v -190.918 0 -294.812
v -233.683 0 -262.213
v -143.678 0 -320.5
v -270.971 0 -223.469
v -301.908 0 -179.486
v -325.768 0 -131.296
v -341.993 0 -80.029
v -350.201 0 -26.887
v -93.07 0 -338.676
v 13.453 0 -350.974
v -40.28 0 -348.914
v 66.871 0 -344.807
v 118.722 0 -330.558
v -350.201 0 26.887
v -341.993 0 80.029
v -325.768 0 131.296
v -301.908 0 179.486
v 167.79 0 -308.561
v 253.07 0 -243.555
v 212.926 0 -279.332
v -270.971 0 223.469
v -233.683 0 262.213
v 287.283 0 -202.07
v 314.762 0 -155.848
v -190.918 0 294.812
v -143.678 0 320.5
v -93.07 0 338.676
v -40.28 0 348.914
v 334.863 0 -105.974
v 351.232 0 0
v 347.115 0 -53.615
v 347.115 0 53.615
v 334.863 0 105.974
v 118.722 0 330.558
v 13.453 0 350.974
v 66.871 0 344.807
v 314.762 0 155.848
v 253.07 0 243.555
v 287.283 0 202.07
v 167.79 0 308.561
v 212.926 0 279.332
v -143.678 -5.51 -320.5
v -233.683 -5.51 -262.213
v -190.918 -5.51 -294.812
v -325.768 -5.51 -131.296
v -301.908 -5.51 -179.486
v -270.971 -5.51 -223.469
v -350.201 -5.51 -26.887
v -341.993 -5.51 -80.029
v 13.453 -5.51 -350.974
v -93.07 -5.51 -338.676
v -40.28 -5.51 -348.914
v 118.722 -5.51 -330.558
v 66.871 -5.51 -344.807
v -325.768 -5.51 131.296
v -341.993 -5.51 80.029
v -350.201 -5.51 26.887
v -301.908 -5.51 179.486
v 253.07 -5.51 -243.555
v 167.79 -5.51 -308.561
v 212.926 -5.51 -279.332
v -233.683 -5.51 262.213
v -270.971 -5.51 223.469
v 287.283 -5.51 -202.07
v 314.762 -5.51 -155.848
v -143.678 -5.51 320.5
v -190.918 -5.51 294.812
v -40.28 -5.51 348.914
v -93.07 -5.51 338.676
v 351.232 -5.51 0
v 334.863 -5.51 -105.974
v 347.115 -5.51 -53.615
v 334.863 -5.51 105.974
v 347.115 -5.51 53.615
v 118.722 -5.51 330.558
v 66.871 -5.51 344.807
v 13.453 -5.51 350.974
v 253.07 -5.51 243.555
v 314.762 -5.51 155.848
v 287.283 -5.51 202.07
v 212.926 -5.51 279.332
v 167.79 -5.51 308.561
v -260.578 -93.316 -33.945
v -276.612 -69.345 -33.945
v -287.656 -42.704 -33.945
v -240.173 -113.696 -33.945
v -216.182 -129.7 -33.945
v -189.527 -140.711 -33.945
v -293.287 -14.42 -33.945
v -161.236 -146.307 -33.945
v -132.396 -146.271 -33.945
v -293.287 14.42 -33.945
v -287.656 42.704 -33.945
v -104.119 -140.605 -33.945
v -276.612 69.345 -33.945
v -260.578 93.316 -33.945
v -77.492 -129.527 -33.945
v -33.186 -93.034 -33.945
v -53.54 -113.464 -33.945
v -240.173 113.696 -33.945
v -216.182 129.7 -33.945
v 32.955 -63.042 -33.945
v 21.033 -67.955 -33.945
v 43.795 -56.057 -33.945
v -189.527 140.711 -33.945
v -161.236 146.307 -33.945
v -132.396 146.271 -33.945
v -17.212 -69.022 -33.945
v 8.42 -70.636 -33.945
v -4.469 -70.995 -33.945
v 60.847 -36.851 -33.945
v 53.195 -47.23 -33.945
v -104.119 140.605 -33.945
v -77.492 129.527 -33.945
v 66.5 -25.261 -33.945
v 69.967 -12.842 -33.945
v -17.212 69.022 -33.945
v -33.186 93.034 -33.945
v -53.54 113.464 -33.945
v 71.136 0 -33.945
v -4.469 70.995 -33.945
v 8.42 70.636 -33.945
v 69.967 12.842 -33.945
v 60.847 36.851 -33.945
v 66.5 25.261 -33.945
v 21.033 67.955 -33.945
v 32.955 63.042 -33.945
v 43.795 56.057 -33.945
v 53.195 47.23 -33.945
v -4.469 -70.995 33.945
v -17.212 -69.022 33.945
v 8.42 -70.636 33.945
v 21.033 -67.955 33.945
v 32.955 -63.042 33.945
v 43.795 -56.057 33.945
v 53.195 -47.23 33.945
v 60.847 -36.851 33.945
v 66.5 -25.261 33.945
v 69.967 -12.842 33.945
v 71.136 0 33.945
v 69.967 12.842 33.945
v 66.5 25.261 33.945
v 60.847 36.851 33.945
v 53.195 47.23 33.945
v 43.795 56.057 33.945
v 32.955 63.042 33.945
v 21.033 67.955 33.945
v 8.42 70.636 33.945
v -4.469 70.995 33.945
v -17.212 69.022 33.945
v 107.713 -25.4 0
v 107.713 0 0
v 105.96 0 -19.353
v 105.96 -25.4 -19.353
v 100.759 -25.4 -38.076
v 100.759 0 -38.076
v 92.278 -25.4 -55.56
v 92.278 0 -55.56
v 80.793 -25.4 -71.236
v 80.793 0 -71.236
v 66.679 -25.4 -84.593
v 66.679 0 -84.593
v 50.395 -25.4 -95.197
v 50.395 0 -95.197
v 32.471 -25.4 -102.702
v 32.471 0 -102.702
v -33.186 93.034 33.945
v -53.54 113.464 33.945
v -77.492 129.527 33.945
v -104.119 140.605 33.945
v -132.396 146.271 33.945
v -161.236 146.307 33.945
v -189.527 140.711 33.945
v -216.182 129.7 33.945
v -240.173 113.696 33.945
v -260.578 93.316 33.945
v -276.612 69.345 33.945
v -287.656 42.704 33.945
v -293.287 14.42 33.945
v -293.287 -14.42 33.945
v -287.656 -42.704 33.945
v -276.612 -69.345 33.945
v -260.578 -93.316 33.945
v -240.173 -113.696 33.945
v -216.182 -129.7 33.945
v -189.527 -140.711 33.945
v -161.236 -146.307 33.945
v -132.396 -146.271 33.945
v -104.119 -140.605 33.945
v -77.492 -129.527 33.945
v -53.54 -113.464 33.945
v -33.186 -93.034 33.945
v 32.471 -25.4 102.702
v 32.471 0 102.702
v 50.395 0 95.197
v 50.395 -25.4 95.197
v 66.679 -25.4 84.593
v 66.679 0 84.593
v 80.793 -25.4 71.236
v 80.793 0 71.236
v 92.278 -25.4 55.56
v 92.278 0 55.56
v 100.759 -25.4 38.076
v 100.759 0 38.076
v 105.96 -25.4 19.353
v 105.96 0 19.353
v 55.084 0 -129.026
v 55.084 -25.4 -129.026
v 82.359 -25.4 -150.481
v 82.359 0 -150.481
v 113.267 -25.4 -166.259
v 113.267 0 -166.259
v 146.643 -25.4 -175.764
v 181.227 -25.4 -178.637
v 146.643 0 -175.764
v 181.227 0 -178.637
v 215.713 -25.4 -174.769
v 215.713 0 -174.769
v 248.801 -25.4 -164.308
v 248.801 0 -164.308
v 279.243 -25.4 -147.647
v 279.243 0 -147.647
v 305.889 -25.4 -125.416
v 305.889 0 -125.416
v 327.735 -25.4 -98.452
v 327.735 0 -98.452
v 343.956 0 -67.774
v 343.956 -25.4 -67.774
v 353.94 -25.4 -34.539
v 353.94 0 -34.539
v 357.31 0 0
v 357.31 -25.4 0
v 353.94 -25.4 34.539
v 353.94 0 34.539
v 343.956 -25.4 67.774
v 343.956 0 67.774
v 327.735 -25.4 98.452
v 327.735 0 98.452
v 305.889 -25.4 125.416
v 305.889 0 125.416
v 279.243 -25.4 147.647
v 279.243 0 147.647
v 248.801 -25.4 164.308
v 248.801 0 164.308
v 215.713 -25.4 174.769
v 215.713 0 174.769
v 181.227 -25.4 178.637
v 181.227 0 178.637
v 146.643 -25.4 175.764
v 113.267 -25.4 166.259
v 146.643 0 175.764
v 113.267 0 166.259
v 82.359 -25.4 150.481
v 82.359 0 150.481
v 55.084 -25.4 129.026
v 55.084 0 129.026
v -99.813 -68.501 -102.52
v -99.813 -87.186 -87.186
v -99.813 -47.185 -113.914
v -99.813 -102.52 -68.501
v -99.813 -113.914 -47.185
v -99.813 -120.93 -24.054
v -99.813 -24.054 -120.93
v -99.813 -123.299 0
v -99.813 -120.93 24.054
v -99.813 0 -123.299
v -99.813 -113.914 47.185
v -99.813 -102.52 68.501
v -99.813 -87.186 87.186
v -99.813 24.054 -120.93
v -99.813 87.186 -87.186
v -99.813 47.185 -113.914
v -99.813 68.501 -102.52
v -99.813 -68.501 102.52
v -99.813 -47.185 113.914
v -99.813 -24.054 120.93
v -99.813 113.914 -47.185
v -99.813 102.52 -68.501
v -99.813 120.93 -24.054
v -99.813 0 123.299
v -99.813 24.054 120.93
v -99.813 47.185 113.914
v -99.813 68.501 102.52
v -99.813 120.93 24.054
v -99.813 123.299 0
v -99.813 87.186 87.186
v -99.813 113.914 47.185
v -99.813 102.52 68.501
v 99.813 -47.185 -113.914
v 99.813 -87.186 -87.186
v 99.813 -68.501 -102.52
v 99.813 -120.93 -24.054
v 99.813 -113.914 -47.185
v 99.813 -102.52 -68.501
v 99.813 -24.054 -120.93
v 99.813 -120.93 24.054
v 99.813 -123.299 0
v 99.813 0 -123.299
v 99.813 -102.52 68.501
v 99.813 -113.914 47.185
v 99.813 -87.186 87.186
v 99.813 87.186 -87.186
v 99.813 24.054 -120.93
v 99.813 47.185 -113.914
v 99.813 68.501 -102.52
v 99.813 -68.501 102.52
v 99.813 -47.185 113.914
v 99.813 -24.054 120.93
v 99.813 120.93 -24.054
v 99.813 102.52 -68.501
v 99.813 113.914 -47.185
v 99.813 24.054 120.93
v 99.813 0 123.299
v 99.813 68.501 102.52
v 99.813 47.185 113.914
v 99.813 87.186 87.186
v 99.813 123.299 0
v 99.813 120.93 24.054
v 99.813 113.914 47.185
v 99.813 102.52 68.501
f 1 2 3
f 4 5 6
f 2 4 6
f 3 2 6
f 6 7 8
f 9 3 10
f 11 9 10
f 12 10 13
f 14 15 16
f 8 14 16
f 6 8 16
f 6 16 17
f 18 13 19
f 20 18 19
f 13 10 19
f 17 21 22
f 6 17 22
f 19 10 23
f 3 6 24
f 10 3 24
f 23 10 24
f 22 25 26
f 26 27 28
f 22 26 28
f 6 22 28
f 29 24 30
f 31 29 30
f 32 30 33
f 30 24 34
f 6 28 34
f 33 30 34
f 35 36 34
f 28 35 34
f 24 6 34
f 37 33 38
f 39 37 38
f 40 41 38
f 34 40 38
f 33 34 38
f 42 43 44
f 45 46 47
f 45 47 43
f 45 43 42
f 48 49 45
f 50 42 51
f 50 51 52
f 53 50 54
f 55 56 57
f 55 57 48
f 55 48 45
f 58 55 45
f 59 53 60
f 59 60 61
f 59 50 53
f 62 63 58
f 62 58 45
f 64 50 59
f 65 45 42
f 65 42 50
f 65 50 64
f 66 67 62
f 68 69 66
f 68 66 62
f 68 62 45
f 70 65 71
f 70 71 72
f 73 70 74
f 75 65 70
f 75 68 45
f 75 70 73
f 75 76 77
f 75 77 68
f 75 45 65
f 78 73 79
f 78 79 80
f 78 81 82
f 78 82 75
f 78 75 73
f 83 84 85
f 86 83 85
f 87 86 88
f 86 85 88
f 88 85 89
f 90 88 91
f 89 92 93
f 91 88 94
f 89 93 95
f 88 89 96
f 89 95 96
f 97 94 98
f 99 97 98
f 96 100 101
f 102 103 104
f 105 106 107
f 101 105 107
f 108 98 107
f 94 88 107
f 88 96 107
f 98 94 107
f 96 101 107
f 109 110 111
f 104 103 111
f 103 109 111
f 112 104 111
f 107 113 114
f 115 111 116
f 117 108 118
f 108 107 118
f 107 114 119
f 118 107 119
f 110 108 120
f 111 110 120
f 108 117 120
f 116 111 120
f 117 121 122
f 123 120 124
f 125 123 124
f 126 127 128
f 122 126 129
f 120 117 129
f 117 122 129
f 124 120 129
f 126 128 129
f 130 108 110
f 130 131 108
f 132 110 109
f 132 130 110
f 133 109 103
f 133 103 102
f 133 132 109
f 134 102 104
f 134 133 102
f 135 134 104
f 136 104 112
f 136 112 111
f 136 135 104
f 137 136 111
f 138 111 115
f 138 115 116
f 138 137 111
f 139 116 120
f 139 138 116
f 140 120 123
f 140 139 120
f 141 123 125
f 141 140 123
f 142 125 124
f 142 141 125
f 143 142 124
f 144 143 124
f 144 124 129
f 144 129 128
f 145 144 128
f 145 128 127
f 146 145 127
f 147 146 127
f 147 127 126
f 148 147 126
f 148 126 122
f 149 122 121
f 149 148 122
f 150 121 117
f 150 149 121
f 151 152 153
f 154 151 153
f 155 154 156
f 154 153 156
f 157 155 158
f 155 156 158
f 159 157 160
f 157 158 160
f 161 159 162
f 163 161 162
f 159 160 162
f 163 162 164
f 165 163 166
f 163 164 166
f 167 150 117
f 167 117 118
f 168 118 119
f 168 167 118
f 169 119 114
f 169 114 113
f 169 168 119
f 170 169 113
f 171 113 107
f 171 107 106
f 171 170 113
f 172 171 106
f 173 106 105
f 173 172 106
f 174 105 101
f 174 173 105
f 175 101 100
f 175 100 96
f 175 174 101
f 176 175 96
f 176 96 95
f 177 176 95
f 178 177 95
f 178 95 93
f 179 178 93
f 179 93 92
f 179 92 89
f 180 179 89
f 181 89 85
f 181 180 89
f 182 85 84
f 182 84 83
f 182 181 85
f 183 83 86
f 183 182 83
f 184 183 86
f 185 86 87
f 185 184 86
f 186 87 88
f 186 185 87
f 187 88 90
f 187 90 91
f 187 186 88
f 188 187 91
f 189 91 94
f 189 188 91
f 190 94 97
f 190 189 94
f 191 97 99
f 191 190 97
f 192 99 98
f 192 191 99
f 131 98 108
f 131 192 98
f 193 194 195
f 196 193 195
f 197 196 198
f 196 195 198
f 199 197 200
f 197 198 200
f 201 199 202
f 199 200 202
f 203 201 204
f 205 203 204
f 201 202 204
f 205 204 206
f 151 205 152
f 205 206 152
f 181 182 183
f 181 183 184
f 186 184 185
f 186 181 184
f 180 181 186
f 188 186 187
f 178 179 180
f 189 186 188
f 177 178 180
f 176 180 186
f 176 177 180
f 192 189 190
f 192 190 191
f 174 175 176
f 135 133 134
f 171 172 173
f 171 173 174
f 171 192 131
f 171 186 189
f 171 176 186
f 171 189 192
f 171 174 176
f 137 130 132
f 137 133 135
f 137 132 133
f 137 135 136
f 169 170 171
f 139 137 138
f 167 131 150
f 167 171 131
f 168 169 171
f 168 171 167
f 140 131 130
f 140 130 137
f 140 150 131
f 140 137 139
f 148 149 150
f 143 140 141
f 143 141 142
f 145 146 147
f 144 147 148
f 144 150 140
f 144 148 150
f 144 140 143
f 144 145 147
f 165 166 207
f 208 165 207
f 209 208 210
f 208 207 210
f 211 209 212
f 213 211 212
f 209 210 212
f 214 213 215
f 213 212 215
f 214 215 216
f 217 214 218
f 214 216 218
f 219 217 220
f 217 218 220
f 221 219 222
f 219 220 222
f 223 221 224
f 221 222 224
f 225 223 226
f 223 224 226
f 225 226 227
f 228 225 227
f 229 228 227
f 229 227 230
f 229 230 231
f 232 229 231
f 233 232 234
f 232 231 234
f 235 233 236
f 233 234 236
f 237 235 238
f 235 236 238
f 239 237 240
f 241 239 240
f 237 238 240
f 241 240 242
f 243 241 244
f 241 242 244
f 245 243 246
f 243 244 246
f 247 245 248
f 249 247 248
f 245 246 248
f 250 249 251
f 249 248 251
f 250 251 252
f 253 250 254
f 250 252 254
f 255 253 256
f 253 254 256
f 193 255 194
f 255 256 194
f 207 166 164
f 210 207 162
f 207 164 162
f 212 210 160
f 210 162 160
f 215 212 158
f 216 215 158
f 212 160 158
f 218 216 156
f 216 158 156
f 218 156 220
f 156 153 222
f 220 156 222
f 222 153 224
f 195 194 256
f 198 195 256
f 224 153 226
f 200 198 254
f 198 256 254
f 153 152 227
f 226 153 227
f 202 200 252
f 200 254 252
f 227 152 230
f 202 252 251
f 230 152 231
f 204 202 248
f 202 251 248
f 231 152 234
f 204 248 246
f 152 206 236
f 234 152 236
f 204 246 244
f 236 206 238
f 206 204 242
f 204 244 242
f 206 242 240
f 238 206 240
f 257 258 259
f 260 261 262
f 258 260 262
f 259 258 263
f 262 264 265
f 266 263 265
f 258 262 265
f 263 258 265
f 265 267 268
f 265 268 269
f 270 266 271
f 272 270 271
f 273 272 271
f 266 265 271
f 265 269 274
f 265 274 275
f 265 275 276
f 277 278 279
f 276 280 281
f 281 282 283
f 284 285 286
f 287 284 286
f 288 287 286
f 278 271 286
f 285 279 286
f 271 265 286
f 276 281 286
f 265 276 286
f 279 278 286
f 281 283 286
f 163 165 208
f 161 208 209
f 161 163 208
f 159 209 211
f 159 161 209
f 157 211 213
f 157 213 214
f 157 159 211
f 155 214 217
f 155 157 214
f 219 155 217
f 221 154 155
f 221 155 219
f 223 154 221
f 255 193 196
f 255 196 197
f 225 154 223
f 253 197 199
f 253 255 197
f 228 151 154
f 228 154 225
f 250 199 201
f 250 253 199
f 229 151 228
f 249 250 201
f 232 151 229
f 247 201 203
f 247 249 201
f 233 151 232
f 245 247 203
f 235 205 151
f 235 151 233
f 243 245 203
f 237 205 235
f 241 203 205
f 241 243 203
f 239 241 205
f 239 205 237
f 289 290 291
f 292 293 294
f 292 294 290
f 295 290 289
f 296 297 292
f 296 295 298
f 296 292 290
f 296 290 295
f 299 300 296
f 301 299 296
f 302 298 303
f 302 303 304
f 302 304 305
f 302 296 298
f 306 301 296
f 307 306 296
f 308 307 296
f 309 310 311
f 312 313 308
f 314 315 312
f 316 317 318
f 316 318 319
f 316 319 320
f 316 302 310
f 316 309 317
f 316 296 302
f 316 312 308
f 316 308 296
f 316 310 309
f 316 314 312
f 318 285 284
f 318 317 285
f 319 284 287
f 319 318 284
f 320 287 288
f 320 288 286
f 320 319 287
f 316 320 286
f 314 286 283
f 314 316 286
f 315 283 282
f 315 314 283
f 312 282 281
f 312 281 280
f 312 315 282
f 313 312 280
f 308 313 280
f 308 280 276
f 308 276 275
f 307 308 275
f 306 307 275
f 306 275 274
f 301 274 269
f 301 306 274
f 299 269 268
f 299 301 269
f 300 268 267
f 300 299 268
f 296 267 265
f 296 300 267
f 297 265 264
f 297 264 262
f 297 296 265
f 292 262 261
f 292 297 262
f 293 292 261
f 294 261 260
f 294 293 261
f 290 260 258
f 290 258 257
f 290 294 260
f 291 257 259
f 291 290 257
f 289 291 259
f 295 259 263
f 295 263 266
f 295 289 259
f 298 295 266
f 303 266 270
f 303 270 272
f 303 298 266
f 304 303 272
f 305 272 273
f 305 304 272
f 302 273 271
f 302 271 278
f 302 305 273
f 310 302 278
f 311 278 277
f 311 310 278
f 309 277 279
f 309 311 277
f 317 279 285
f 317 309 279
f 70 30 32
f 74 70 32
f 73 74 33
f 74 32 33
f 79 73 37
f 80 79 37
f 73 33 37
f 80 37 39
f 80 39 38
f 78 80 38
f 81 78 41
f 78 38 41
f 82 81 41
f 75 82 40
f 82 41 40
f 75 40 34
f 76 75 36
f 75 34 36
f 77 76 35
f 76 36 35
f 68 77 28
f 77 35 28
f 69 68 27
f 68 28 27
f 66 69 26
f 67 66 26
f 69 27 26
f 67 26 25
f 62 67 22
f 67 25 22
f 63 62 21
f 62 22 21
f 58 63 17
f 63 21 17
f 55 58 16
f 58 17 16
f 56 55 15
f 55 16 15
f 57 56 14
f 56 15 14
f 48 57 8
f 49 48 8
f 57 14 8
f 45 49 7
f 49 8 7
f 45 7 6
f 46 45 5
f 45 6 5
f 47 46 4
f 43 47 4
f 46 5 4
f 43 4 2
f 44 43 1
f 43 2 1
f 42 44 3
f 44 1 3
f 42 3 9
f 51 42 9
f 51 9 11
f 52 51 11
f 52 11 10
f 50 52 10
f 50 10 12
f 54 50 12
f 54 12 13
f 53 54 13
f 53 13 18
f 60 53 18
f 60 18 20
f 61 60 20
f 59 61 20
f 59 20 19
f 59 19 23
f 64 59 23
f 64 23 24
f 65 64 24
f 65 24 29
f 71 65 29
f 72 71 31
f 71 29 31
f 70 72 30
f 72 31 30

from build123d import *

# Parameters (mm, degrees)
F3_DEPTH = 25.4
F4_DEPTH = 33.9451208711
F2_R     = 123.299198533
F5_DEPTH = 99.812948145
F6_R     = 351.2317205635
F7_DEPTH = 5.5103451014


with BuildPart() as f3:
    # F0 (on Front) → F3 (new body)
    with BuildSketch(Plane.XZ):
        with BuildLine():
            ThreePointArc((32.4707977179, 102.702457163), (86.8898240425, 63.6577245086), (107.7132647902, 0))
            ThreePointArc((107.7132647902, 0), (86.8898240425, -63.6577245086), (32.4707977179, -102.702457163))
            ThreePointArc((32.4707977179, -102.702457163), (232.5117352441, -170.3440897743), (357.310205698, 0))
            ThreePointArc((357.310205698, 0), (232.5117352441, 170.3440897743), (32.4707977179, 102.702457163))
        make_face()
    extrude(amount=F3_DEPTH)


with BuildPart() as f4:
    # F1 (on Top) → F4 (new body, symmetric)
    with BuildSketch(Plane.XY):
        with BuildLine():
            ThreePointArc((-17.2122190879, -69.0221971367), (-4.3679501662, -35.5679778154), (0, 0))
            ThreePointArc((0, 0), (-4.3679501662, 35.5679778154), (-17.2122190879, 69.0221971367))
            ThreePointArc((-17.2122190879, 69.0221971367), (-71.1359556308, 0), (-17.2122190879, -69.0221971367))
        make_face()
        with BuildLine():
            ThreePointArc((-17.2122190879, 69.0221971367), (-4.3679501662, 35.5679778154), (0, 0))
            ThreePointArc((0, 0), (-4.3679501662, -35.5679778154), (-17.2122190879, -69.0221971367))
            ThreePointArc((-17.2122190879, -69.0221971367), (43.7945003977, -56.0568097418), (71.1359556308, 0))
            ThreePointArc((71.1359556308, 0), (43.7945003977, 56.0568097418), (-17.2122190879, 69.0221971367))
        make_face()
        with BuildLine():
            ThreePointArc((-17.2122190879, -69.0221971367), (-71.1359556308, 0), (-17.2122190879, 69.0221971367))
            ThreePointArc((-17.2122190879, 69.0221971367), (-293.9960360527, 0), (-17.2122190879, -69.0221971367))
        make_face()
    extrude(amount=F4_DEPTH, both=True)


with BuildPart() as f5:
    # F2 (on Right) → F5 (new body, symmetric)
    with BuildSketch(Plane.YZ):
        Circle(F2_R)
    extrude(amount=F5_DEPTH, both=True)


with BuildPart() as f7:
    # F6 (on Front) → F7 (new body)
    with BuildSketch(Plane.XZ):
        Circle(F6_R)
    extrude(amount=F7_DEPTH)


solid = Compound([f3.part, f4.part, f5.part, f7.part])
